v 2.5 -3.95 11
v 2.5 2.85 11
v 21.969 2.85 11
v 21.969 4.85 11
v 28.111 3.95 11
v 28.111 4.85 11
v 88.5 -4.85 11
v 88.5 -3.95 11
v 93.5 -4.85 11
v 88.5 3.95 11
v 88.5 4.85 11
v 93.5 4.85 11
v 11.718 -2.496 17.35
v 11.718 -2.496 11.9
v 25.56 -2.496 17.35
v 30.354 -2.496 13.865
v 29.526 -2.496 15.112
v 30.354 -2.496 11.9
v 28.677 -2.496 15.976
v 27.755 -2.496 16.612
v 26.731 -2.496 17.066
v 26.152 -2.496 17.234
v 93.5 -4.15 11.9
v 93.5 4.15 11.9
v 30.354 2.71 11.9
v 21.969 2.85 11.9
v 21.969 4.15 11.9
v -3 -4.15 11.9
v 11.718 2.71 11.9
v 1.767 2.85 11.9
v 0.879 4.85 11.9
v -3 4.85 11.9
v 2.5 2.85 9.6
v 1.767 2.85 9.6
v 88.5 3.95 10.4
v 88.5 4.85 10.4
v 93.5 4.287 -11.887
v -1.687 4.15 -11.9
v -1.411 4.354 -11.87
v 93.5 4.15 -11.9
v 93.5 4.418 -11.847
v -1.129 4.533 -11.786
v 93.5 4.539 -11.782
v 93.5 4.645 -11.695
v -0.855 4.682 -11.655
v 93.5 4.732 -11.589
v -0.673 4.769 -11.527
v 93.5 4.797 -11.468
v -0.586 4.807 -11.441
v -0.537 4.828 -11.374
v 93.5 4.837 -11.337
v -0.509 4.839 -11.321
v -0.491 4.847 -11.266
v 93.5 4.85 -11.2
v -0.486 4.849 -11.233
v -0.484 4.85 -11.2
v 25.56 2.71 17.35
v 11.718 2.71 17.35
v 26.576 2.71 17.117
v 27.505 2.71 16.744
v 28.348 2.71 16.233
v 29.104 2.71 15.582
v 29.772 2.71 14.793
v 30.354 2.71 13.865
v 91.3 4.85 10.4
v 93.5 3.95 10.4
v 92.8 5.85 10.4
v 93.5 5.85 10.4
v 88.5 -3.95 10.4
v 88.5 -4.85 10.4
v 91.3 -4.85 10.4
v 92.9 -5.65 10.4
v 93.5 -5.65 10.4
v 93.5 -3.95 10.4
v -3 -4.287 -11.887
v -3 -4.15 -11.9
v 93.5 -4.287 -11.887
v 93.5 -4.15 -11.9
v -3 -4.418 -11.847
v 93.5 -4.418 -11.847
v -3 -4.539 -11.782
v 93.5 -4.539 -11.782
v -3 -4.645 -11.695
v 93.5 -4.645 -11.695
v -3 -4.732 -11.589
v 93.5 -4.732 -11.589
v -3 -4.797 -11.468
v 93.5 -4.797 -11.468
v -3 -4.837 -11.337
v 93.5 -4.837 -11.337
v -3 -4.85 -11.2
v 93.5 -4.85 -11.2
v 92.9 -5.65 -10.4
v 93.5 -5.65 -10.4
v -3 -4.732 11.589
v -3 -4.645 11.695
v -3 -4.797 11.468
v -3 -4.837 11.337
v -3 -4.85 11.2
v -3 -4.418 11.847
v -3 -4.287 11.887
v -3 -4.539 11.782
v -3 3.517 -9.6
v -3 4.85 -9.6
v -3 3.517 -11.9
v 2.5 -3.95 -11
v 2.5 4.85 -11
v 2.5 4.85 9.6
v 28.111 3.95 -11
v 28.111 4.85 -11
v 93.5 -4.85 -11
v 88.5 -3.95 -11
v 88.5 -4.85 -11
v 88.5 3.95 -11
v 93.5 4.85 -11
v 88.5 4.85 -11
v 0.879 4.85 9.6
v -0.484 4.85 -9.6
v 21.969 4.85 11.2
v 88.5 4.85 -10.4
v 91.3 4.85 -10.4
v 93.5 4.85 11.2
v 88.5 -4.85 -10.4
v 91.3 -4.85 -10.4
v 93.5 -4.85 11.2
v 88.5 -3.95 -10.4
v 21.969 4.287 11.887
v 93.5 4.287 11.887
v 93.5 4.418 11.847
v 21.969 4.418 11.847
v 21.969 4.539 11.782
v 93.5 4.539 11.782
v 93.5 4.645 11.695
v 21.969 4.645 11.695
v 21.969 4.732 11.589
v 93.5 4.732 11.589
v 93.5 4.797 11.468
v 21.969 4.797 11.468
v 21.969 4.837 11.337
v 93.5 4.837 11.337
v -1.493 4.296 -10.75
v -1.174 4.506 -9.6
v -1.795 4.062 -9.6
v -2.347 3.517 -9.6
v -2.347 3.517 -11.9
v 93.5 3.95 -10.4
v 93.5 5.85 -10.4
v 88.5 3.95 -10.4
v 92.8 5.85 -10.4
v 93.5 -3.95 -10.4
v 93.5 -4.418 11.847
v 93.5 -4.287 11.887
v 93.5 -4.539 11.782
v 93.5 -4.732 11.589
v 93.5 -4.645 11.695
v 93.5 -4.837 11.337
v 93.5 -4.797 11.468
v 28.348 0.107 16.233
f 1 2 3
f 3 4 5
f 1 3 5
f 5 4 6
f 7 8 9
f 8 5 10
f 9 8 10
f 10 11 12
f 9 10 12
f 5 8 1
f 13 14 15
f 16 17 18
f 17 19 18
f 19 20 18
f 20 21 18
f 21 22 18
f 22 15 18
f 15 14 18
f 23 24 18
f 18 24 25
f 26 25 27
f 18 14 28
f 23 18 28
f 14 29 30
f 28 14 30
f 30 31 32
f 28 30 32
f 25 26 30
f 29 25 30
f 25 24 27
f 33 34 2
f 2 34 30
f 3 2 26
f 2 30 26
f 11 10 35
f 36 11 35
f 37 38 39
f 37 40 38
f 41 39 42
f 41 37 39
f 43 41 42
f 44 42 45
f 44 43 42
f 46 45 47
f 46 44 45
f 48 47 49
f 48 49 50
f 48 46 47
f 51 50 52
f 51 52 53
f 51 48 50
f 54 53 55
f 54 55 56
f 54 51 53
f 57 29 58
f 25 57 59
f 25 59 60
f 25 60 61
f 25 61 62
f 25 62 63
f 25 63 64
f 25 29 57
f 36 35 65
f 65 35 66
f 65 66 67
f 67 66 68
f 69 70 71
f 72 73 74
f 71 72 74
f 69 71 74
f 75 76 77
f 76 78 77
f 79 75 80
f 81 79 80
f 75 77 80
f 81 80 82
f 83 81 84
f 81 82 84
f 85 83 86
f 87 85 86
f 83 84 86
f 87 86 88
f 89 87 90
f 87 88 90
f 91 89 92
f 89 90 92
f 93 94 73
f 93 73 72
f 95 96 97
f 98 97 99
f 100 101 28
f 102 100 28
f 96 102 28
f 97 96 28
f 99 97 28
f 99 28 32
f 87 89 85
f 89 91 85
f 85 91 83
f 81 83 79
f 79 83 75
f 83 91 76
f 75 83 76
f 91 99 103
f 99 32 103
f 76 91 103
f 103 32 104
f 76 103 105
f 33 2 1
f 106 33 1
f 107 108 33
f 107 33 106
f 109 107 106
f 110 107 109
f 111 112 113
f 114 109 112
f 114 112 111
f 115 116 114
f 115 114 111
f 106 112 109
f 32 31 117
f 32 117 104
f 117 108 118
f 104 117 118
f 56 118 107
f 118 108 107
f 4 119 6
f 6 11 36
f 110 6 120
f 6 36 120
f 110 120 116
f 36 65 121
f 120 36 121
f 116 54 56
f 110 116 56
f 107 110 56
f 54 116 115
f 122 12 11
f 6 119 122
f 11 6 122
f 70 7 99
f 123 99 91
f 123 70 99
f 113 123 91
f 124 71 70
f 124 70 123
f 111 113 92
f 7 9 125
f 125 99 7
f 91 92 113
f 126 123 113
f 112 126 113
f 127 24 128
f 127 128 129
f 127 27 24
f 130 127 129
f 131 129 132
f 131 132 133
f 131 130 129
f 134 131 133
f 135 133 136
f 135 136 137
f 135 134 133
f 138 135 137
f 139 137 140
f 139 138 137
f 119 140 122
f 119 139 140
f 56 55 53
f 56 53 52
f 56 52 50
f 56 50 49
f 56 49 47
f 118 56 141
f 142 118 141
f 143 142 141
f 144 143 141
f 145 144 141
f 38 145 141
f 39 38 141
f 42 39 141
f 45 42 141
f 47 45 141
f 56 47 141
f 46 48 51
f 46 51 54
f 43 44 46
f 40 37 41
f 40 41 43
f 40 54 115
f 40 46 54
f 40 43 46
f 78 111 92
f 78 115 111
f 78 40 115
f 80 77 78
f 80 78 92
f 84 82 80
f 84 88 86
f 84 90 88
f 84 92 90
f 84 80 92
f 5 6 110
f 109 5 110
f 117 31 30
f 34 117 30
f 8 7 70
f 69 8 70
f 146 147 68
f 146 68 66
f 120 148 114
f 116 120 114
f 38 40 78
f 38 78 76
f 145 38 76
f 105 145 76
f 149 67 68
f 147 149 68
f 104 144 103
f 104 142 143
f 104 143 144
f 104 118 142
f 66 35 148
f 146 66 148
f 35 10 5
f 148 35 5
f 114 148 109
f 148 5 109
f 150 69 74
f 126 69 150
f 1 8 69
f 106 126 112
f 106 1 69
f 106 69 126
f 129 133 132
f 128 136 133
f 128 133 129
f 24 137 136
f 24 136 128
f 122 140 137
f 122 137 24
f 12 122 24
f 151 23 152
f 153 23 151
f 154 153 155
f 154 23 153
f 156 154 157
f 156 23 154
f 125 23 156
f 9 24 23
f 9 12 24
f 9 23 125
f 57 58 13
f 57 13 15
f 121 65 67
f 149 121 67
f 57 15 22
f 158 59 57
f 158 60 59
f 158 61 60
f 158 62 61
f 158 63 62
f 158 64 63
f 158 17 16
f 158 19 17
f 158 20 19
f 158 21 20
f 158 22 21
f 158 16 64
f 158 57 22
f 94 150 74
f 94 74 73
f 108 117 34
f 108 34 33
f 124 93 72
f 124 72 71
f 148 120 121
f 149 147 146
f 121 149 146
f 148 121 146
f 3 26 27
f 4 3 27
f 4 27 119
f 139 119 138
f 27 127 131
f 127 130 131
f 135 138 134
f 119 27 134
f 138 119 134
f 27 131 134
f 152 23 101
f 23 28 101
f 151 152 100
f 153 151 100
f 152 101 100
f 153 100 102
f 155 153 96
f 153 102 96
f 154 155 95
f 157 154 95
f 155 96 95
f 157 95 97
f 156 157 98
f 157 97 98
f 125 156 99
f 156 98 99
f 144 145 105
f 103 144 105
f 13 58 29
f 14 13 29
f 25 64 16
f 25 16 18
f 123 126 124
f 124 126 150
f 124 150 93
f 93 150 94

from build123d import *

# Parameters (mm, degrees)
SKETCH_1_W           = 23.8
SKETCH_1_H           = 9.7
SKETCH_1_W_2         = 22
SKETCH_1_H_2         = 7.9
EXTRUDE_1_DEPTH      = 93.5
SKETCH_5_W           = 30.862098313
SKETCH_5_H           = 22
CUT_EXTRUDE_1_DEPTH  = 5
EXTRUDE_3_DEPTH      = 3
EXTRUDE_3_DEPTH_BACK = 2.5
CUT_EXTRUDE_2_DEPTH  = 2.3
CUT_EXTRUDE_3_DEPTH  = 2.3
SKETCH_10_W          = 27.414514358
SKETCH_10_H          = 5.206733811
EXTRUDE_4_DEPTH      = 5.45
EXTRUDE_5_DEPTH      = 23.8
CUT_EXTRUDE_4_DEPTH  = 10
CUT_EXTRUDE_5_DEPTH  = 5
FILLET_2_R           = 0.7


with BuildPart() as part:
    # 草图1 → 凸台-拉伸1 (new body)
    with BuildSketch(Plane(origin=(0, 0, 0), x_dir=(0, 0, -1), z_dir=(1, 0, 0))):
        Rectangle(SKETCH_1_W, SKETCH_1_H)
        Rectangle(SKETCH_1_W_2, SKETCH_1_H_2, mode=Mode.SUBTRACT)
    extrude(amount=EXTRUDE_1_DEPTH)

    # 草图5 → 切除-拉伸1 (cut)
    with BuildSketch(Plane(origin=(0, 4.85, 0), x_dir=(1, 0, 0), z_dir=(0, 1, 0))):
        with Locations((12.679771903, 0)):
            Rectangle(SKETCH_5_W, SKETCH_5_H)
    extrude(amount=-CUT_EXTRUDE_1_DEPTH, mode=Mode.SUBTRACT)

    # 草图7 → 凸台-拉伸3 (add, two sides: drawn at the far end of the back side and taken through both)
    with BuildSketch(Plane.ZY.offset(-EXTRUDE_3_DEPTH_BACK)):
        Polygon((-11, 4.85), (11, 4.85), (11.9, 4.85), (11.9, -4.85), (-11.9, -4.85), (-11.9, 4.85), align=None)
    extrude(amount=EXTRUDE_3_DEPTH + EXTRUDE_3_DEPTH_BACK)

    # 草图8 → 切除-拉伸2 (cut)
    with BuildSketch(Plane.XY.offset(11.9)):
        Polygon((0.878787233, 4.85), (1.766547003, 2.85), (21.968929262, 2.85), (21.968929262, 4.85), align=None)
    extrude(amount=-CUT_EXTRUDE_2_DEPTH, mode=Mode.SUBTRACT)

    # 草图9 → 切除-拉伸3 (cut)
    with BuildSketch(Plane(origin=(0, 0, -11.9), x_dir=(-1, 0, 0), z_dir=(0, 0, -1))):
        with BuildLine():
            Line((2.347261018, 3.516538115), (3, 3.516538115))
            Line((3, 3.516538115), (3, 4.85))
            Line((3, 4.85), (0.483692493, 4.85))
            add(Edge.make_bspline(
                [(0.483692493, 4.85), (1.57048018, 4.409488755), (2.347261018, 3.516538115)],
                knots=[0, 0, 0, 1, 1, 1], degree=2))
        make_face()
    extrude(amount=-CUT_EXTRUDE_3_DEPTH, mode=Mode.SUBTRACT)

    # 草图10 → 凸台-拉伸4 (add)
    with BuildSketch(Plane.XY.offset(11.9)):
        with Locations((17.041287755, 0.106962124)):
            Rectangle(SKETCH_10_W, SKETCH_10_H)
    extrude(amount=EXTRUDE_4_DEPTH)

    # 草图11 → 凸台-拉伸5 (add)
    with BuildSketch(Plane(origin=(0, 0, -11.9), x_dir=(-1, 0, 0), z_dir=(0, 0, -1))):
        Polygon((-93.5, -4.85), (-93.5, -5.65), (-92.9, -5.65), (-91.3, -4.85), align=None)
        Polygon((-91.3, 4.85), (-92.8, 5.85), (-93.5, 5.85), (-93.5, 4.85), align=None)
    extrude(amount=-EXTRUDE_5_DEPTH)

    # 草图12 → 切除-拉伸4 (cut)
    with BuildSketch(Plane(origin=(0, 2.71032903, 0), x_dir=(1, 0, 0), z_dir=(0, 1, 0))):
        with BuildLine():
            Line((30.354179143, -13.864715533), (30.354179143, -11.9))
            Line((30.354179143, -11.9), (31.029316872, -11.9))
            Line((31.029316872, -11.9), (31.273931991, -17.729634416))
            Line((31.273931991, -17.729634416), (25.559722807, -17.35))
            add(Edge.make_bspline(
                [(25.559722807, -17.35), (28.738846795, -16.858311071), (30.354179143, -13.864715533)],
                knots=[0, 0, 0, 1, 1, 1], degree=2))
        make_face()
        Polygon((11.717782686, -17.35), (11.717782686, -11.9), (1.430390108, -11.9), (1.430390108, -18.181001755), align=None)
    extrude(amount=-CUT_EXTRUDE_4_DEPTH, mode=Mode.SUBTRACT)

    # 草图14 → 切除-拉伸5 (cut)
    with BuildSketch(Plane(origin=(93.5, 0, 0), x_dir=(0, 0, -1), z_dir=(1, 0, 0))):
        Polygon((-11, 5.85), (-11.9, 5.85), (-11.9, 4.85), (-11, 4.85), (-11, -4.85), (-11.9, -4.85), (-11.9, -5.65), (-11, -5.65), (-10.4, -5.65), (-10.4, 5.85), align=None)
        Polygon((11.9, 5.85), (11, 5.85), (10.4, 5.85), (10.4, -5.65), (11, -5.65), (11.9, -5.65), (11.9, -4.85), (11, -4.85), (11, 4.85), (11.9, 4.85), align=None)
    extrude(amount=-CUT_EXTRUDE_5_DEPTH, mode=Mode.SUBTRACT)

    # 圆角2
    fillet_2_edges = [part.edges().sort_by_distance(p)[0] for p in [
        (46.508153753, 4.85, -11.9),
        (45.25, -4.85, -11.9),
        (45.25, -4.85, 11.9),
        (57.734464631, 4.85, 11.9),
    ]]
    fillet(fillet_2_edges, radius=FILLET_2_R)


solid = part.part
